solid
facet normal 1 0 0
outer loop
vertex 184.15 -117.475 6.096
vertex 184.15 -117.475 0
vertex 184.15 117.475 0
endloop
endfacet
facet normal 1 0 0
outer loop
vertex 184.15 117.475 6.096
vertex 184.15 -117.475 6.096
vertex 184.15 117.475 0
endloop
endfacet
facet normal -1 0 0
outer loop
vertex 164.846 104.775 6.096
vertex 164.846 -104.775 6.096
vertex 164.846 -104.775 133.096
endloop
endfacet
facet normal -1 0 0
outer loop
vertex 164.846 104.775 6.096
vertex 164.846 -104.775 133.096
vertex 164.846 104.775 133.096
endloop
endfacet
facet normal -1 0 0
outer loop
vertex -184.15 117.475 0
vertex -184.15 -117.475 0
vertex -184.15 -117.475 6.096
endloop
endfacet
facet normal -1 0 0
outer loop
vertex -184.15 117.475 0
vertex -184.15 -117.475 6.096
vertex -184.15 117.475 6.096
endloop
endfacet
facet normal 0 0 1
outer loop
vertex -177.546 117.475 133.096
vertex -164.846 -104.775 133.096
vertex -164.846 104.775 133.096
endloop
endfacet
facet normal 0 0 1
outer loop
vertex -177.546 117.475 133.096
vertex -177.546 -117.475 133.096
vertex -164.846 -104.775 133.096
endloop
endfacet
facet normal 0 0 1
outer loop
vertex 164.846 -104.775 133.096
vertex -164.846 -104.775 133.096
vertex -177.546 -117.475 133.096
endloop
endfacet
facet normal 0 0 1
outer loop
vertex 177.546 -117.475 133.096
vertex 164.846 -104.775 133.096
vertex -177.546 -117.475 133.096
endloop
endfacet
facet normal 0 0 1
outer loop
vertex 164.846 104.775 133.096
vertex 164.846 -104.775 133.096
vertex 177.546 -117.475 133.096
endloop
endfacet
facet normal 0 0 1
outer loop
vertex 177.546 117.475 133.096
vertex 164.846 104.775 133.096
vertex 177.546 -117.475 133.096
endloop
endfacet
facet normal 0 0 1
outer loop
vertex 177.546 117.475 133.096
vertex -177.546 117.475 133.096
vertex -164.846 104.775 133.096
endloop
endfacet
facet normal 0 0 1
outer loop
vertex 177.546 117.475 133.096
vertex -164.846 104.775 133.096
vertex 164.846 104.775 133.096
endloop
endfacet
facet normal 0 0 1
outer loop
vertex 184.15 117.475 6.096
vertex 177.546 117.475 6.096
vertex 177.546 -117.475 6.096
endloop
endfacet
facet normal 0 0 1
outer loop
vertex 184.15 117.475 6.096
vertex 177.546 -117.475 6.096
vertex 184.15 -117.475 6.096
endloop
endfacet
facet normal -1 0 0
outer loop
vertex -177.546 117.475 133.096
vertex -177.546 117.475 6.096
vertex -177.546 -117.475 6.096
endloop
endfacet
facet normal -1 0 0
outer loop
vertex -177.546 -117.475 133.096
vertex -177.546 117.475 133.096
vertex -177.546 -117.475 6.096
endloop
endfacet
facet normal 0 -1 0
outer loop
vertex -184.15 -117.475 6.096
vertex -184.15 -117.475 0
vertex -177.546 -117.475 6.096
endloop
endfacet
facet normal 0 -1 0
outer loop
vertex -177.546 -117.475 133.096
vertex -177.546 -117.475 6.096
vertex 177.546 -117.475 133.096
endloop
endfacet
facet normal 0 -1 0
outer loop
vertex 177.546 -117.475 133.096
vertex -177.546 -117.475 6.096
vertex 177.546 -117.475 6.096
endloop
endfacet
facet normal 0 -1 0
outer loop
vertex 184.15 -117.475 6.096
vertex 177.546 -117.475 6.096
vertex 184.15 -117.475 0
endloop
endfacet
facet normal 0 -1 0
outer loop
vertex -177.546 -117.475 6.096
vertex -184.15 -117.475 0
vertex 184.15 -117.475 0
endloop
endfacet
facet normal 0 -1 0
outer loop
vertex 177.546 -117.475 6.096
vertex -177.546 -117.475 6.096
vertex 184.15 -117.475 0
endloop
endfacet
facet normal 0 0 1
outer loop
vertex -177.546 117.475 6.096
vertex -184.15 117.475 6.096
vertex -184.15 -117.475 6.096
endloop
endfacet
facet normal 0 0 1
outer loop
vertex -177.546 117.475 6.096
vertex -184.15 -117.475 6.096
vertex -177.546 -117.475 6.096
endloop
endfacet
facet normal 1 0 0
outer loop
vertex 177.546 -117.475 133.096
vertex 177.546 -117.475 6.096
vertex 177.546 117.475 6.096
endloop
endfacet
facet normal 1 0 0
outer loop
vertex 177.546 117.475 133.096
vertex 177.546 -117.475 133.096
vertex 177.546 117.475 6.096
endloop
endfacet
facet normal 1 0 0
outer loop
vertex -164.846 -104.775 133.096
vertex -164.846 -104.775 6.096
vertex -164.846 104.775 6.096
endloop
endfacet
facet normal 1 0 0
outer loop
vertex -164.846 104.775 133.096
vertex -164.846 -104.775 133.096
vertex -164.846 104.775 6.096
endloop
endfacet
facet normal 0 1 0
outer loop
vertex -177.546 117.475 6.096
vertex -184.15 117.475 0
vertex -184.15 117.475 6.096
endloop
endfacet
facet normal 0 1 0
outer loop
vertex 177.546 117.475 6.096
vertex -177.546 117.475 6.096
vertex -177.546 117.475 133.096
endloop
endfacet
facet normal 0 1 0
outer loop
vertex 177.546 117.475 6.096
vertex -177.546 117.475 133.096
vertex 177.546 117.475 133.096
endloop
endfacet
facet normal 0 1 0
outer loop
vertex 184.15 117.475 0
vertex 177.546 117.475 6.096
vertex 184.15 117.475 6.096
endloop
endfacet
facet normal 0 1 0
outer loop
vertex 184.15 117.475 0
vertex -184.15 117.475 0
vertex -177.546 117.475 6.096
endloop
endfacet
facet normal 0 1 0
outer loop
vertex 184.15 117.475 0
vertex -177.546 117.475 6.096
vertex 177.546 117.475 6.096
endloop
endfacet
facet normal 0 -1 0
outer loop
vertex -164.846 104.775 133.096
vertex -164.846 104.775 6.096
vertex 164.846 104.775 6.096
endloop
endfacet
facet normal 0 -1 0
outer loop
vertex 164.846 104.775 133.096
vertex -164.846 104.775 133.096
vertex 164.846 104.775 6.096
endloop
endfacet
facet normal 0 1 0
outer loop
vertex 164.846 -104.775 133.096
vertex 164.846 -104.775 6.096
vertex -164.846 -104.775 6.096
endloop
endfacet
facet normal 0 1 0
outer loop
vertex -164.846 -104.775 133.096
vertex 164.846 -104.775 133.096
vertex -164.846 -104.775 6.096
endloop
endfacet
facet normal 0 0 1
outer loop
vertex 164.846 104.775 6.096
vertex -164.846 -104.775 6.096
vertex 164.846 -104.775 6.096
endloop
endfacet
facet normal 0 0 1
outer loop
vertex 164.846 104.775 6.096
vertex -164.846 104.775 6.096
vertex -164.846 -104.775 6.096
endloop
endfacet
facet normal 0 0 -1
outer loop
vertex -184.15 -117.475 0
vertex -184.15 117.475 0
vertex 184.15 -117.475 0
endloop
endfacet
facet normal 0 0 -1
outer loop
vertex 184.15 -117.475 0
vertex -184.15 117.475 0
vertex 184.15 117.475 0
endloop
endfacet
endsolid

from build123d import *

# Parameters (mm, degrees)
F0_W     = 368.3
F0_H     = 234.95
F1_DEPTH = 6.096
F2_W     = 12.7
F2_H     = 209.55
F3_DEPTH = 127


with BuildPart() as f1:
    # F0 (on Top) → F1 (new body)
    with BuildSketch(Plane.XY):
        Rectangle(F0_W, F0_H)
    extrude(amount=F1_DEPTH)

    # F2 (on face) → F3 (join)
    with BuildSketch(Plane.XY.offset(6.096)):
        with Locations((171.196, 0)):
            Rectangle(F2_W, F2_H)
        Polygon((177.546, 104.775), (177.546, 117.475), (-177.546, 117.475), (-177.546, 104.775), (-164.846, 104.775), (164.846, 104.775), align=None)
        with Locations((-171.196, 0)):
            Rectangle(F2_W, F2_H)
        Polygon((177.546, -117.475), (177.546, -104.775), (164.846, -104.775), (-164.846, -104.775), (-177.546, -104.775), (-177.546, -117.475), align=None)
    extrude(amount=F3_DEPTH)


solid = f1.part
